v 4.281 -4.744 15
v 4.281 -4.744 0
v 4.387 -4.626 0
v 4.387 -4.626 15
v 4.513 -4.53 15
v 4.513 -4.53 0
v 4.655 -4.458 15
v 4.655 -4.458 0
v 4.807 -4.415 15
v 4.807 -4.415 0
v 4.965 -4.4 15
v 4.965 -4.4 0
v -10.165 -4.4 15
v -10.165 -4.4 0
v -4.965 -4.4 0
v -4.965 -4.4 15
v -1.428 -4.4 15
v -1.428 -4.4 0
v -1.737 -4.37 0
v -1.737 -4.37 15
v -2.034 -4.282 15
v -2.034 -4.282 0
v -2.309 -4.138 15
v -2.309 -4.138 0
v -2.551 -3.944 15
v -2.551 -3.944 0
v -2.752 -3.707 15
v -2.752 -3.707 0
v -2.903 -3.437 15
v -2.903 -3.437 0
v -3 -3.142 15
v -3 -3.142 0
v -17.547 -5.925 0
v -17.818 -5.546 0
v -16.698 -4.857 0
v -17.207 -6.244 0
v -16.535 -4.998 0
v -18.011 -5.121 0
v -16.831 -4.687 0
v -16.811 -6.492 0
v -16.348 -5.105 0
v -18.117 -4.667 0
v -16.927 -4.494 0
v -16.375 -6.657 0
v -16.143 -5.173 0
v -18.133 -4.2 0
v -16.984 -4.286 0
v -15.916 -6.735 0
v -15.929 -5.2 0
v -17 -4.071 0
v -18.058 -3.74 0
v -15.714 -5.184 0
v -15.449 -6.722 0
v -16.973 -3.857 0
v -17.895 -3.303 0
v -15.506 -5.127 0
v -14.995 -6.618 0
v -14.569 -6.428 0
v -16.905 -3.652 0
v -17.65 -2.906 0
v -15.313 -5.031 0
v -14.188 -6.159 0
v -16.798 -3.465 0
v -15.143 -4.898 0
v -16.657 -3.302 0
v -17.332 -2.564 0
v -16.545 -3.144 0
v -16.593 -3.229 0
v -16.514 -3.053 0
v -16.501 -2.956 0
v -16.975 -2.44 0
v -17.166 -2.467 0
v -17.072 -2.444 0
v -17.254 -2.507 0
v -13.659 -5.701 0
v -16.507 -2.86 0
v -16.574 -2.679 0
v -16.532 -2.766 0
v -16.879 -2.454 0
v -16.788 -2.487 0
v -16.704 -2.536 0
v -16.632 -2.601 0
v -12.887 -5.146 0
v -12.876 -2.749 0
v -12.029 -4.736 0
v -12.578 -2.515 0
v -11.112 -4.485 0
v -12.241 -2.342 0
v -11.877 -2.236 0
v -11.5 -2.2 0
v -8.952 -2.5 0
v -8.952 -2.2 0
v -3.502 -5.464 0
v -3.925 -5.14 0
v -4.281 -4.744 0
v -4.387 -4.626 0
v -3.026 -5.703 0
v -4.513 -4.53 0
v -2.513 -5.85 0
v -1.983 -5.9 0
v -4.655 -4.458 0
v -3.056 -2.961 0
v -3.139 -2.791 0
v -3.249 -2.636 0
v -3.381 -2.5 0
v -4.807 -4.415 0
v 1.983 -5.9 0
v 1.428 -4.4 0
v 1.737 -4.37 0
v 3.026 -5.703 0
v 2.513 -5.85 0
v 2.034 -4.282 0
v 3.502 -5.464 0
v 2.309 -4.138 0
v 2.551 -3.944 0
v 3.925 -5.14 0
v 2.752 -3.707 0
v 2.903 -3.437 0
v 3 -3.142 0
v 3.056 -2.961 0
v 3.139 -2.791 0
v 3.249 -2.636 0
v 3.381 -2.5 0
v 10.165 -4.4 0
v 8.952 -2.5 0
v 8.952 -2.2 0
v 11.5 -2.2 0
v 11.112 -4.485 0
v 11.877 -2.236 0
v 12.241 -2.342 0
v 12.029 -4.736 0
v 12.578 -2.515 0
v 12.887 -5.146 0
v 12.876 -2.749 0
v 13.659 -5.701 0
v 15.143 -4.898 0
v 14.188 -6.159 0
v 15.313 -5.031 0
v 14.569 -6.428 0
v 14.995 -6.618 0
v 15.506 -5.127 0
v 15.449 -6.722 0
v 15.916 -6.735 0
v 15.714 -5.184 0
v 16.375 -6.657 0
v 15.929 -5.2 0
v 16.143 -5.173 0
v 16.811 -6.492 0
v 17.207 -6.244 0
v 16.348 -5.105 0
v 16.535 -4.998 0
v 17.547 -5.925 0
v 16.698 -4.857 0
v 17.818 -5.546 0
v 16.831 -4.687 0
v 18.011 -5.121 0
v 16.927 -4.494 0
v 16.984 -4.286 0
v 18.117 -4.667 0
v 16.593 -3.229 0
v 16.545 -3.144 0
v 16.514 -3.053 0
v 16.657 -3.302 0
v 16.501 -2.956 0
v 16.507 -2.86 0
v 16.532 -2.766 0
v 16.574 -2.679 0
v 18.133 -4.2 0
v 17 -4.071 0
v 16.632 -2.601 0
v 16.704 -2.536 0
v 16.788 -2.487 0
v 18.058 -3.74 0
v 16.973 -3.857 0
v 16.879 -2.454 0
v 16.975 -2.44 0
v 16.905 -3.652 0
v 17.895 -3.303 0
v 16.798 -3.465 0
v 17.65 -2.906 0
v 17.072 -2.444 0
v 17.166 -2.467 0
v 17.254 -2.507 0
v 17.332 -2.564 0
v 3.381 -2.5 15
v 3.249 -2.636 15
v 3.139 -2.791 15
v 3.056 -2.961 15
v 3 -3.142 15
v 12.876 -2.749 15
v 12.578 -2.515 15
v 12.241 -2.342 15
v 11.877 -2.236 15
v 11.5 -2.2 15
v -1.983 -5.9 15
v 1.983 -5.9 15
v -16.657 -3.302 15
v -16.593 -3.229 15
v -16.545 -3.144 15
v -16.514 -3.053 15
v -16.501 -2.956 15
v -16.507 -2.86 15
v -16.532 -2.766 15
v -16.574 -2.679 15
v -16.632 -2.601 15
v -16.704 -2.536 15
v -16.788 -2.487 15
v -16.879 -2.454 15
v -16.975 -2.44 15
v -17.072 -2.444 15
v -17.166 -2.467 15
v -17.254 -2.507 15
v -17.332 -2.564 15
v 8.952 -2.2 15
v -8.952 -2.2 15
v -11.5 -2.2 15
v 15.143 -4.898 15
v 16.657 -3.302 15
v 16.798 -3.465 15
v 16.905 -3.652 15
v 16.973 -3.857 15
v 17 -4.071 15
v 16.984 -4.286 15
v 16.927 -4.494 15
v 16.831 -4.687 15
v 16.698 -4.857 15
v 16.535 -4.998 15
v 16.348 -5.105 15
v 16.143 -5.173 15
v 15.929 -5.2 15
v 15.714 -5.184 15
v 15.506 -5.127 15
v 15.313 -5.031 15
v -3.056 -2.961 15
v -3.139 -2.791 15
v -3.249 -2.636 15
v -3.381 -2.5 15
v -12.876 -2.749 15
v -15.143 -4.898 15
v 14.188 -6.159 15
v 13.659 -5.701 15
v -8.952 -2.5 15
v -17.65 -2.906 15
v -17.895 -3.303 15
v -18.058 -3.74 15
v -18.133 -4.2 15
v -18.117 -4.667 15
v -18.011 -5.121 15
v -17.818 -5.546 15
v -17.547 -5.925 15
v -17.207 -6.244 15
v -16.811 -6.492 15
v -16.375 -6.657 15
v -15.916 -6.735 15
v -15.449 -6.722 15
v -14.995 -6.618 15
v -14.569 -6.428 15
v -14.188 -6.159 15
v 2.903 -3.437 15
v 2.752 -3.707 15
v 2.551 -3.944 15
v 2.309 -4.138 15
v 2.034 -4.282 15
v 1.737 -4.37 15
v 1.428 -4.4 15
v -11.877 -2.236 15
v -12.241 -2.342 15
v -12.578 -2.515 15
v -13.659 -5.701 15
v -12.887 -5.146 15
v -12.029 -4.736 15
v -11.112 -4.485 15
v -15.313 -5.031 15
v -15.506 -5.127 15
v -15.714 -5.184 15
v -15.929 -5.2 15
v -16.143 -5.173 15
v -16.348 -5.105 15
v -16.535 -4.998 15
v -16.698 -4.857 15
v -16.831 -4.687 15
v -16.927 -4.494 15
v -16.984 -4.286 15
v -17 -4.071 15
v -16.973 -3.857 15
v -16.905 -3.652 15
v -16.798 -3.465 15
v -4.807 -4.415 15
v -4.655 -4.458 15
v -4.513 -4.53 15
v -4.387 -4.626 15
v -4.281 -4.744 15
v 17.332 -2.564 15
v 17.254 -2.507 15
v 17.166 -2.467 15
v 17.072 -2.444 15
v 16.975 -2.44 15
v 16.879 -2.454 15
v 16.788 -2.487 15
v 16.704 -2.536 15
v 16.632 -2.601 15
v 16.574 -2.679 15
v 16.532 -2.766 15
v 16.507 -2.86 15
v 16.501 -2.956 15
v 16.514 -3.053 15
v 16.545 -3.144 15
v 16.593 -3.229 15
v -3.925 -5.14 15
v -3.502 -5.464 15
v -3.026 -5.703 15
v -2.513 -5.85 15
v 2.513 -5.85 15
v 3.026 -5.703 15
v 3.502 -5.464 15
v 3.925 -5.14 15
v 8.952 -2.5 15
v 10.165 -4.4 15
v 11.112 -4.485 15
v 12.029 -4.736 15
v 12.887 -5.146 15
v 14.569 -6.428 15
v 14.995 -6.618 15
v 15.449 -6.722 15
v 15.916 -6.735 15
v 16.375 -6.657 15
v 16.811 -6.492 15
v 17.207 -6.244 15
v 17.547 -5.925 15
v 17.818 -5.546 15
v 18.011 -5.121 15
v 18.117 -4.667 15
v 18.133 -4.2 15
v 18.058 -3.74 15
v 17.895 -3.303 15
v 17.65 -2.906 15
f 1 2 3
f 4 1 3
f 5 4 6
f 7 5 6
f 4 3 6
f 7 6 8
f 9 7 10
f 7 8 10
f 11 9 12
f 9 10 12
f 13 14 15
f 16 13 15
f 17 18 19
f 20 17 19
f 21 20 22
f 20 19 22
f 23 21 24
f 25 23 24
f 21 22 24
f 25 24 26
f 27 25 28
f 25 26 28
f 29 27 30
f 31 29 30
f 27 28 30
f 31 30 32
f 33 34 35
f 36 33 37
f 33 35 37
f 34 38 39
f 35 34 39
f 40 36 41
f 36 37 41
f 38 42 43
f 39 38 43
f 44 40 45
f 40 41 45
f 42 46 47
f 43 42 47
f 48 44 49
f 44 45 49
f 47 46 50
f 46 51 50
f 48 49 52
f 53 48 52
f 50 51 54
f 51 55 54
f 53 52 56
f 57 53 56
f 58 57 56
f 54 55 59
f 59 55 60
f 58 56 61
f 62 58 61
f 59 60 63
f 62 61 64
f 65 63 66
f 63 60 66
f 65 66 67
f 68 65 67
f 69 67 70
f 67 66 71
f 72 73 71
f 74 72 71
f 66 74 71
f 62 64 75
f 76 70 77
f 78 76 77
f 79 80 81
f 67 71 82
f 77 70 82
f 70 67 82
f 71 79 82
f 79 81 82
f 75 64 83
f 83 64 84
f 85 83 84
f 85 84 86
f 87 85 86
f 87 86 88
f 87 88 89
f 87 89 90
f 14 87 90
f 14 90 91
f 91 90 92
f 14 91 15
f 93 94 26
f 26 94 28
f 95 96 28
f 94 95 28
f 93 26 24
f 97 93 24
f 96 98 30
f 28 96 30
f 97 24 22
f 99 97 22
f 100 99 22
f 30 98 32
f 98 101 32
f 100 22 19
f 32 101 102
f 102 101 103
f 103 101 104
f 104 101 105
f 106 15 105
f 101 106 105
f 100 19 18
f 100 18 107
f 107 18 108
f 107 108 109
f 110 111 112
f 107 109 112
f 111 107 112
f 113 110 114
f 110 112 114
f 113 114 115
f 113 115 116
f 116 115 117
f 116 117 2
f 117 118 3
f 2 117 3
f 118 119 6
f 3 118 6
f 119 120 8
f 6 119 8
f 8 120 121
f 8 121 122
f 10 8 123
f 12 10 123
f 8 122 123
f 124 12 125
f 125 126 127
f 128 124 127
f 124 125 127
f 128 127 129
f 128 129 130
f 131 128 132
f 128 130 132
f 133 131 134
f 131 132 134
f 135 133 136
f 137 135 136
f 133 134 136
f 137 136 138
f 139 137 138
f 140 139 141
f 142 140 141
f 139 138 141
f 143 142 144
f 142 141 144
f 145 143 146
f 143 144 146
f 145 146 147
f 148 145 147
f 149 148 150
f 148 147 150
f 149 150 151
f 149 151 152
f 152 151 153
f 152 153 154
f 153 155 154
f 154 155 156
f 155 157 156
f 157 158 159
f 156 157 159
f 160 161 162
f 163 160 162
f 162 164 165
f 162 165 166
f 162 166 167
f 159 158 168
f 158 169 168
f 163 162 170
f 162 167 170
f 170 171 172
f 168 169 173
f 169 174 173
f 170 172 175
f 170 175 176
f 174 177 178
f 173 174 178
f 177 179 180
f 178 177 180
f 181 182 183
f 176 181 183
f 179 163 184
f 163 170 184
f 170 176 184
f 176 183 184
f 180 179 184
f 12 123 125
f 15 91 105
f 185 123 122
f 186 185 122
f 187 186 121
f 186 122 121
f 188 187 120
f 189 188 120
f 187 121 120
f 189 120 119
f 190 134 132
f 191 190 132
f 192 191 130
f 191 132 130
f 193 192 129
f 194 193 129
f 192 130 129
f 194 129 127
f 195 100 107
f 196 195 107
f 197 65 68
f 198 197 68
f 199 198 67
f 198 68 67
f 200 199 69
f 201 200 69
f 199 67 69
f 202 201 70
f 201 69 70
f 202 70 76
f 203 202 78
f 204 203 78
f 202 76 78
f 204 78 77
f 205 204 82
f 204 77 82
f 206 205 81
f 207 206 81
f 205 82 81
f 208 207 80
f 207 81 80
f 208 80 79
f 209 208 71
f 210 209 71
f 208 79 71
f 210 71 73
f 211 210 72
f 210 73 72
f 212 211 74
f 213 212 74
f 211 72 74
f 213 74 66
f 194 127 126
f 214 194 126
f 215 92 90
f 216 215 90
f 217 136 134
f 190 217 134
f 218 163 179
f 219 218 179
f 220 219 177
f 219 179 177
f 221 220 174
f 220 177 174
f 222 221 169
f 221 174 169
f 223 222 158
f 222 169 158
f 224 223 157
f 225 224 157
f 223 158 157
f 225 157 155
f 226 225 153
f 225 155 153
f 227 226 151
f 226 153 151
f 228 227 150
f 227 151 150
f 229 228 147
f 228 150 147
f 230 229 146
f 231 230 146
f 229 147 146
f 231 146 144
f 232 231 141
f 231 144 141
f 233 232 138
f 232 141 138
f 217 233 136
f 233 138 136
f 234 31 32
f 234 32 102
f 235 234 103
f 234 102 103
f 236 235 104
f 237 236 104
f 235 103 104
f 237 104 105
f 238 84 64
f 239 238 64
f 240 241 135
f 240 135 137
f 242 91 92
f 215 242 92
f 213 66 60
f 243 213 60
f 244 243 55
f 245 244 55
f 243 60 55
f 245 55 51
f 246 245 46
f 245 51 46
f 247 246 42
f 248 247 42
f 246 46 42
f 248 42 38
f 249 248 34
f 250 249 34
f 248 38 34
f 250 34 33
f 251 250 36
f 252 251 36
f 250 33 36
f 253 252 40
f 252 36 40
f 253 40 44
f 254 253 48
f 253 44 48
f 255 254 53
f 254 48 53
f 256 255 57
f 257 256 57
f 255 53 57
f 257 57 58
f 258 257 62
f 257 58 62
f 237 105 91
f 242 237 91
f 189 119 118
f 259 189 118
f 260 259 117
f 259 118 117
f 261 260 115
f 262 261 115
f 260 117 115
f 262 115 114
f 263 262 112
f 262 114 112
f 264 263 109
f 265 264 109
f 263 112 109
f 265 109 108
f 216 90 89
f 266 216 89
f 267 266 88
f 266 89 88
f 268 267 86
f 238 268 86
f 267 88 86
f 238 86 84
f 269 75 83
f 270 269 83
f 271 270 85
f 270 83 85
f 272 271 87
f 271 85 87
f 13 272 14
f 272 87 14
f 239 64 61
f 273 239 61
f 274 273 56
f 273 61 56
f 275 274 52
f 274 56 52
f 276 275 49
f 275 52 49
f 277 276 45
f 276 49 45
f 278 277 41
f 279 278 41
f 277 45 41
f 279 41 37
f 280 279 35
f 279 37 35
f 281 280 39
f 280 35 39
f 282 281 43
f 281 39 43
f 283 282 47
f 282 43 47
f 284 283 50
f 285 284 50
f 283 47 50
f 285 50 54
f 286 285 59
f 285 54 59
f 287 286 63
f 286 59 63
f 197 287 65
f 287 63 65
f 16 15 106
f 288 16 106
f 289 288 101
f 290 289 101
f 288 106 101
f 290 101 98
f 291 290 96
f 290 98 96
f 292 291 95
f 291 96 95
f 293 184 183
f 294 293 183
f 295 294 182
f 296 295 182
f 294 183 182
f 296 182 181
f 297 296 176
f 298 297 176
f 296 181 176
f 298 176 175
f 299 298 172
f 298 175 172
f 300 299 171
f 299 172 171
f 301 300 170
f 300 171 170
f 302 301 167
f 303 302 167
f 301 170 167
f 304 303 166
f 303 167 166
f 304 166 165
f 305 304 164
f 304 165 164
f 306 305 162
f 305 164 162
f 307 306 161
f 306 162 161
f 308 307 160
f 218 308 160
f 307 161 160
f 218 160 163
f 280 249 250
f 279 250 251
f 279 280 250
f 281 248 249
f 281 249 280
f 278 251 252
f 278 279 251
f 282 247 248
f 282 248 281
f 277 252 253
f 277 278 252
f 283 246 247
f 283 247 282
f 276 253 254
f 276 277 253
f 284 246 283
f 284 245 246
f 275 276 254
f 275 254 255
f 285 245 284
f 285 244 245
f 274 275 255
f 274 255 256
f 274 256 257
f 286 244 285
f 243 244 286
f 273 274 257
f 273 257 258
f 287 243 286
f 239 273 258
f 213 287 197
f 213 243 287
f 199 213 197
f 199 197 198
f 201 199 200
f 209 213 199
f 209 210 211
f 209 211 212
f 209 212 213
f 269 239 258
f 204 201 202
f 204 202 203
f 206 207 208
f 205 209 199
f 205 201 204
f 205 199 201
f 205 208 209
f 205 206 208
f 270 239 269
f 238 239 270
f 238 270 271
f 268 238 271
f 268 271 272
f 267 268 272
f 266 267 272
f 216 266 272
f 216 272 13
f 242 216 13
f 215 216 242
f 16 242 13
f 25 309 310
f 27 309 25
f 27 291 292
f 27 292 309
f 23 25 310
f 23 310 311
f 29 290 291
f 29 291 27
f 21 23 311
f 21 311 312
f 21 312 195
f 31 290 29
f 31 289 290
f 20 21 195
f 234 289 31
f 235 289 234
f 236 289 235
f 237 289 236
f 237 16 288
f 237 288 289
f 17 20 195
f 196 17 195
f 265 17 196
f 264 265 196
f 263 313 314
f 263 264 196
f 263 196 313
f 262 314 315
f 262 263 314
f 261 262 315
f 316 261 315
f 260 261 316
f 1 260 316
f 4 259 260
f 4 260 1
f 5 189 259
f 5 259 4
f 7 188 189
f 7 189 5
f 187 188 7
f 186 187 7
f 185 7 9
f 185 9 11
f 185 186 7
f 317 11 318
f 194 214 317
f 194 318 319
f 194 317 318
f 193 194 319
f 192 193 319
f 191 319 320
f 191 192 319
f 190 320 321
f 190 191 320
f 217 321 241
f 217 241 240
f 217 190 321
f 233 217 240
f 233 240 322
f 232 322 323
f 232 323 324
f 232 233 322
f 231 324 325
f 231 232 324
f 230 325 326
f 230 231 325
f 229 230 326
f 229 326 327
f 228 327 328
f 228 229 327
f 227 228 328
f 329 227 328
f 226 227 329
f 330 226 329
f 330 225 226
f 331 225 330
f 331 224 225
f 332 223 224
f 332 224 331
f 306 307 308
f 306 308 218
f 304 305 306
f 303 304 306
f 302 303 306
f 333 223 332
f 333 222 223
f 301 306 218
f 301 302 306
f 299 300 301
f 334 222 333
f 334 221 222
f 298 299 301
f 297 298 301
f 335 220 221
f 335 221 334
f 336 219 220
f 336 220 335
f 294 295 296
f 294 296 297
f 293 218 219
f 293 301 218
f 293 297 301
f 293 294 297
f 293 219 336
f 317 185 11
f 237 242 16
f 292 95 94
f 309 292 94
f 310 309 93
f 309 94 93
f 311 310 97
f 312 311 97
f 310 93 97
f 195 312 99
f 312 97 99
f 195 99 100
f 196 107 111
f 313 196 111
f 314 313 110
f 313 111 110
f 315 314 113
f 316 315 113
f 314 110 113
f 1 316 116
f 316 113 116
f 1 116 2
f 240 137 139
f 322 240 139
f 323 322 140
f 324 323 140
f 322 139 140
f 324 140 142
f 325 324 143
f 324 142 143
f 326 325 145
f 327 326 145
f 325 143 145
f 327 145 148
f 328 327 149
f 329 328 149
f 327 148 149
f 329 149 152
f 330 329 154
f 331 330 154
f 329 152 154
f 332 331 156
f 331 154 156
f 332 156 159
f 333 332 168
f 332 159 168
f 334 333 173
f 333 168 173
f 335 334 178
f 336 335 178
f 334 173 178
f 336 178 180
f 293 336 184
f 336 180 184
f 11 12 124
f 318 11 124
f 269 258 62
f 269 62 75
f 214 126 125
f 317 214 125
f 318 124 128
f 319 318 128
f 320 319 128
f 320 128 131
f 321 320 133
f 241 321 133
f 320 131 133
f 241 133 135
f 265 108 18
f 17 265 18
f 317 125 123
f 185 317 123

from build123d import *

# Parameters (mm, degrees)
F1_DEPTH = 15


with BuildPart() as f1:
    # F0 (on Top) → F1 (new body)
    with BuildSketch(Plane.XY):
        with BuildLine():
            Line((11.5, -2.2), (8.951817, -2.2))
            Line((8.951817, -2.2), (8.951817, -2.5))
            Line((8.951817, -2.5), (3.380814, -2.5))
            ThreePointArc((3.380814, -2.5), (3.139489, -2.790809), (3, -3.142021))
            ThreePointArc((3, -3.142021), (2.434954, -4.046773), (1.428434, -4.4))
            Line((1.428434, -4.4), (0, -4.4))
            Line((0, -4.4), (-1.428434, -4.4))
            ThreePointArc((-1.428434, -4.4), (-2.434954, -4.046773), (-3, -3.142021))
            ThreePointArc((-3, -3.142021), (-3.139489, -2.790809), (-3.380814, -2.5))
            Line((-3.380814, -2.5), (-8.951817, -2.5))
            Line((-8.951817, -2.5), (-8.951817, -2.2))
            Line((-8.951817, -2.2), (-11.5, -2.2))
            ThreePointArc((-11.5, -2.2), (-12.240729, -2.342227), (-12.876106, -2.748679))
            Line((-12.876106, -2.748679), (-15.143142, -4.898226))
            ThreePointArc((-15.143142, -4.898226), (-16.698226, -4.856858), (-16.656858, -3.301774))
            ThreePointArc((-16.656858, -3.301774), (-16.632203, -2.601088), (-17.332363, -2.564418))
            ThreePointArc((-17.332363, -2.564418), (-17.546933, -5.924986), (-14.187646, -6.158764))
            Line((-14.187646, -6.158764), (-13.658737, -5.70133))
            ThreePointArc((-13.658737, -5.70133), (-12.02897, -4.735894), (-10.164732, -4.4))
            Line((-10.164732, -4.4), (-4.96455, -4.4))
            ThreePointArc((-4.96455, -4.4), (-4.582113, -4.49077), (-4.281257, -4.743718))
            ThreePointArc((-4.281257, -4.743718), (-3.269164, -5.594645), (-1.98263, -5.9))
            Line((-1.98263, -5.9), (0, -5.9))
            Line((0, -5.9), (1.98263, -5.9))
            ThreePointArc((1.98263, -5.9), (3.269164, -5.594645), (4.281257, -4.743718))
            ThreePointArc((4.281257, -4.743718), (4.582113, -4.49077), (4.96455, -4.4))
            Line((4.96455, -4.4), (10.164732, -4.4))
            ThreePointArc((10.164732, -4.4), (12.02897, -4.735894), (13.658737, -5.70133))
            Line((13.658737, -5.70133), (14.187646, -6.158764))
            ThreePointArc((14.187646, -6.158764), (17.546933, -5.924986), (17.332363, -2.564418))
            ThreePointArc((17.332363, -2.564418), (16.632203, -2.601088), (16.656858, -3.301774))
            ThreePointArc((16.656858, -3.301774), (16.698226, -4.856858), (15.143142, -4.898226))
            Line((15.143142, -4.898226), (12.876106, -2.748679))
            ThreePointArc((12.876106, -2.748679), (12.240729, -2.342227), (11.5, -2.2))
        make_face()
    extrude(amount=F1_DEPTH)


solid = f1.part
